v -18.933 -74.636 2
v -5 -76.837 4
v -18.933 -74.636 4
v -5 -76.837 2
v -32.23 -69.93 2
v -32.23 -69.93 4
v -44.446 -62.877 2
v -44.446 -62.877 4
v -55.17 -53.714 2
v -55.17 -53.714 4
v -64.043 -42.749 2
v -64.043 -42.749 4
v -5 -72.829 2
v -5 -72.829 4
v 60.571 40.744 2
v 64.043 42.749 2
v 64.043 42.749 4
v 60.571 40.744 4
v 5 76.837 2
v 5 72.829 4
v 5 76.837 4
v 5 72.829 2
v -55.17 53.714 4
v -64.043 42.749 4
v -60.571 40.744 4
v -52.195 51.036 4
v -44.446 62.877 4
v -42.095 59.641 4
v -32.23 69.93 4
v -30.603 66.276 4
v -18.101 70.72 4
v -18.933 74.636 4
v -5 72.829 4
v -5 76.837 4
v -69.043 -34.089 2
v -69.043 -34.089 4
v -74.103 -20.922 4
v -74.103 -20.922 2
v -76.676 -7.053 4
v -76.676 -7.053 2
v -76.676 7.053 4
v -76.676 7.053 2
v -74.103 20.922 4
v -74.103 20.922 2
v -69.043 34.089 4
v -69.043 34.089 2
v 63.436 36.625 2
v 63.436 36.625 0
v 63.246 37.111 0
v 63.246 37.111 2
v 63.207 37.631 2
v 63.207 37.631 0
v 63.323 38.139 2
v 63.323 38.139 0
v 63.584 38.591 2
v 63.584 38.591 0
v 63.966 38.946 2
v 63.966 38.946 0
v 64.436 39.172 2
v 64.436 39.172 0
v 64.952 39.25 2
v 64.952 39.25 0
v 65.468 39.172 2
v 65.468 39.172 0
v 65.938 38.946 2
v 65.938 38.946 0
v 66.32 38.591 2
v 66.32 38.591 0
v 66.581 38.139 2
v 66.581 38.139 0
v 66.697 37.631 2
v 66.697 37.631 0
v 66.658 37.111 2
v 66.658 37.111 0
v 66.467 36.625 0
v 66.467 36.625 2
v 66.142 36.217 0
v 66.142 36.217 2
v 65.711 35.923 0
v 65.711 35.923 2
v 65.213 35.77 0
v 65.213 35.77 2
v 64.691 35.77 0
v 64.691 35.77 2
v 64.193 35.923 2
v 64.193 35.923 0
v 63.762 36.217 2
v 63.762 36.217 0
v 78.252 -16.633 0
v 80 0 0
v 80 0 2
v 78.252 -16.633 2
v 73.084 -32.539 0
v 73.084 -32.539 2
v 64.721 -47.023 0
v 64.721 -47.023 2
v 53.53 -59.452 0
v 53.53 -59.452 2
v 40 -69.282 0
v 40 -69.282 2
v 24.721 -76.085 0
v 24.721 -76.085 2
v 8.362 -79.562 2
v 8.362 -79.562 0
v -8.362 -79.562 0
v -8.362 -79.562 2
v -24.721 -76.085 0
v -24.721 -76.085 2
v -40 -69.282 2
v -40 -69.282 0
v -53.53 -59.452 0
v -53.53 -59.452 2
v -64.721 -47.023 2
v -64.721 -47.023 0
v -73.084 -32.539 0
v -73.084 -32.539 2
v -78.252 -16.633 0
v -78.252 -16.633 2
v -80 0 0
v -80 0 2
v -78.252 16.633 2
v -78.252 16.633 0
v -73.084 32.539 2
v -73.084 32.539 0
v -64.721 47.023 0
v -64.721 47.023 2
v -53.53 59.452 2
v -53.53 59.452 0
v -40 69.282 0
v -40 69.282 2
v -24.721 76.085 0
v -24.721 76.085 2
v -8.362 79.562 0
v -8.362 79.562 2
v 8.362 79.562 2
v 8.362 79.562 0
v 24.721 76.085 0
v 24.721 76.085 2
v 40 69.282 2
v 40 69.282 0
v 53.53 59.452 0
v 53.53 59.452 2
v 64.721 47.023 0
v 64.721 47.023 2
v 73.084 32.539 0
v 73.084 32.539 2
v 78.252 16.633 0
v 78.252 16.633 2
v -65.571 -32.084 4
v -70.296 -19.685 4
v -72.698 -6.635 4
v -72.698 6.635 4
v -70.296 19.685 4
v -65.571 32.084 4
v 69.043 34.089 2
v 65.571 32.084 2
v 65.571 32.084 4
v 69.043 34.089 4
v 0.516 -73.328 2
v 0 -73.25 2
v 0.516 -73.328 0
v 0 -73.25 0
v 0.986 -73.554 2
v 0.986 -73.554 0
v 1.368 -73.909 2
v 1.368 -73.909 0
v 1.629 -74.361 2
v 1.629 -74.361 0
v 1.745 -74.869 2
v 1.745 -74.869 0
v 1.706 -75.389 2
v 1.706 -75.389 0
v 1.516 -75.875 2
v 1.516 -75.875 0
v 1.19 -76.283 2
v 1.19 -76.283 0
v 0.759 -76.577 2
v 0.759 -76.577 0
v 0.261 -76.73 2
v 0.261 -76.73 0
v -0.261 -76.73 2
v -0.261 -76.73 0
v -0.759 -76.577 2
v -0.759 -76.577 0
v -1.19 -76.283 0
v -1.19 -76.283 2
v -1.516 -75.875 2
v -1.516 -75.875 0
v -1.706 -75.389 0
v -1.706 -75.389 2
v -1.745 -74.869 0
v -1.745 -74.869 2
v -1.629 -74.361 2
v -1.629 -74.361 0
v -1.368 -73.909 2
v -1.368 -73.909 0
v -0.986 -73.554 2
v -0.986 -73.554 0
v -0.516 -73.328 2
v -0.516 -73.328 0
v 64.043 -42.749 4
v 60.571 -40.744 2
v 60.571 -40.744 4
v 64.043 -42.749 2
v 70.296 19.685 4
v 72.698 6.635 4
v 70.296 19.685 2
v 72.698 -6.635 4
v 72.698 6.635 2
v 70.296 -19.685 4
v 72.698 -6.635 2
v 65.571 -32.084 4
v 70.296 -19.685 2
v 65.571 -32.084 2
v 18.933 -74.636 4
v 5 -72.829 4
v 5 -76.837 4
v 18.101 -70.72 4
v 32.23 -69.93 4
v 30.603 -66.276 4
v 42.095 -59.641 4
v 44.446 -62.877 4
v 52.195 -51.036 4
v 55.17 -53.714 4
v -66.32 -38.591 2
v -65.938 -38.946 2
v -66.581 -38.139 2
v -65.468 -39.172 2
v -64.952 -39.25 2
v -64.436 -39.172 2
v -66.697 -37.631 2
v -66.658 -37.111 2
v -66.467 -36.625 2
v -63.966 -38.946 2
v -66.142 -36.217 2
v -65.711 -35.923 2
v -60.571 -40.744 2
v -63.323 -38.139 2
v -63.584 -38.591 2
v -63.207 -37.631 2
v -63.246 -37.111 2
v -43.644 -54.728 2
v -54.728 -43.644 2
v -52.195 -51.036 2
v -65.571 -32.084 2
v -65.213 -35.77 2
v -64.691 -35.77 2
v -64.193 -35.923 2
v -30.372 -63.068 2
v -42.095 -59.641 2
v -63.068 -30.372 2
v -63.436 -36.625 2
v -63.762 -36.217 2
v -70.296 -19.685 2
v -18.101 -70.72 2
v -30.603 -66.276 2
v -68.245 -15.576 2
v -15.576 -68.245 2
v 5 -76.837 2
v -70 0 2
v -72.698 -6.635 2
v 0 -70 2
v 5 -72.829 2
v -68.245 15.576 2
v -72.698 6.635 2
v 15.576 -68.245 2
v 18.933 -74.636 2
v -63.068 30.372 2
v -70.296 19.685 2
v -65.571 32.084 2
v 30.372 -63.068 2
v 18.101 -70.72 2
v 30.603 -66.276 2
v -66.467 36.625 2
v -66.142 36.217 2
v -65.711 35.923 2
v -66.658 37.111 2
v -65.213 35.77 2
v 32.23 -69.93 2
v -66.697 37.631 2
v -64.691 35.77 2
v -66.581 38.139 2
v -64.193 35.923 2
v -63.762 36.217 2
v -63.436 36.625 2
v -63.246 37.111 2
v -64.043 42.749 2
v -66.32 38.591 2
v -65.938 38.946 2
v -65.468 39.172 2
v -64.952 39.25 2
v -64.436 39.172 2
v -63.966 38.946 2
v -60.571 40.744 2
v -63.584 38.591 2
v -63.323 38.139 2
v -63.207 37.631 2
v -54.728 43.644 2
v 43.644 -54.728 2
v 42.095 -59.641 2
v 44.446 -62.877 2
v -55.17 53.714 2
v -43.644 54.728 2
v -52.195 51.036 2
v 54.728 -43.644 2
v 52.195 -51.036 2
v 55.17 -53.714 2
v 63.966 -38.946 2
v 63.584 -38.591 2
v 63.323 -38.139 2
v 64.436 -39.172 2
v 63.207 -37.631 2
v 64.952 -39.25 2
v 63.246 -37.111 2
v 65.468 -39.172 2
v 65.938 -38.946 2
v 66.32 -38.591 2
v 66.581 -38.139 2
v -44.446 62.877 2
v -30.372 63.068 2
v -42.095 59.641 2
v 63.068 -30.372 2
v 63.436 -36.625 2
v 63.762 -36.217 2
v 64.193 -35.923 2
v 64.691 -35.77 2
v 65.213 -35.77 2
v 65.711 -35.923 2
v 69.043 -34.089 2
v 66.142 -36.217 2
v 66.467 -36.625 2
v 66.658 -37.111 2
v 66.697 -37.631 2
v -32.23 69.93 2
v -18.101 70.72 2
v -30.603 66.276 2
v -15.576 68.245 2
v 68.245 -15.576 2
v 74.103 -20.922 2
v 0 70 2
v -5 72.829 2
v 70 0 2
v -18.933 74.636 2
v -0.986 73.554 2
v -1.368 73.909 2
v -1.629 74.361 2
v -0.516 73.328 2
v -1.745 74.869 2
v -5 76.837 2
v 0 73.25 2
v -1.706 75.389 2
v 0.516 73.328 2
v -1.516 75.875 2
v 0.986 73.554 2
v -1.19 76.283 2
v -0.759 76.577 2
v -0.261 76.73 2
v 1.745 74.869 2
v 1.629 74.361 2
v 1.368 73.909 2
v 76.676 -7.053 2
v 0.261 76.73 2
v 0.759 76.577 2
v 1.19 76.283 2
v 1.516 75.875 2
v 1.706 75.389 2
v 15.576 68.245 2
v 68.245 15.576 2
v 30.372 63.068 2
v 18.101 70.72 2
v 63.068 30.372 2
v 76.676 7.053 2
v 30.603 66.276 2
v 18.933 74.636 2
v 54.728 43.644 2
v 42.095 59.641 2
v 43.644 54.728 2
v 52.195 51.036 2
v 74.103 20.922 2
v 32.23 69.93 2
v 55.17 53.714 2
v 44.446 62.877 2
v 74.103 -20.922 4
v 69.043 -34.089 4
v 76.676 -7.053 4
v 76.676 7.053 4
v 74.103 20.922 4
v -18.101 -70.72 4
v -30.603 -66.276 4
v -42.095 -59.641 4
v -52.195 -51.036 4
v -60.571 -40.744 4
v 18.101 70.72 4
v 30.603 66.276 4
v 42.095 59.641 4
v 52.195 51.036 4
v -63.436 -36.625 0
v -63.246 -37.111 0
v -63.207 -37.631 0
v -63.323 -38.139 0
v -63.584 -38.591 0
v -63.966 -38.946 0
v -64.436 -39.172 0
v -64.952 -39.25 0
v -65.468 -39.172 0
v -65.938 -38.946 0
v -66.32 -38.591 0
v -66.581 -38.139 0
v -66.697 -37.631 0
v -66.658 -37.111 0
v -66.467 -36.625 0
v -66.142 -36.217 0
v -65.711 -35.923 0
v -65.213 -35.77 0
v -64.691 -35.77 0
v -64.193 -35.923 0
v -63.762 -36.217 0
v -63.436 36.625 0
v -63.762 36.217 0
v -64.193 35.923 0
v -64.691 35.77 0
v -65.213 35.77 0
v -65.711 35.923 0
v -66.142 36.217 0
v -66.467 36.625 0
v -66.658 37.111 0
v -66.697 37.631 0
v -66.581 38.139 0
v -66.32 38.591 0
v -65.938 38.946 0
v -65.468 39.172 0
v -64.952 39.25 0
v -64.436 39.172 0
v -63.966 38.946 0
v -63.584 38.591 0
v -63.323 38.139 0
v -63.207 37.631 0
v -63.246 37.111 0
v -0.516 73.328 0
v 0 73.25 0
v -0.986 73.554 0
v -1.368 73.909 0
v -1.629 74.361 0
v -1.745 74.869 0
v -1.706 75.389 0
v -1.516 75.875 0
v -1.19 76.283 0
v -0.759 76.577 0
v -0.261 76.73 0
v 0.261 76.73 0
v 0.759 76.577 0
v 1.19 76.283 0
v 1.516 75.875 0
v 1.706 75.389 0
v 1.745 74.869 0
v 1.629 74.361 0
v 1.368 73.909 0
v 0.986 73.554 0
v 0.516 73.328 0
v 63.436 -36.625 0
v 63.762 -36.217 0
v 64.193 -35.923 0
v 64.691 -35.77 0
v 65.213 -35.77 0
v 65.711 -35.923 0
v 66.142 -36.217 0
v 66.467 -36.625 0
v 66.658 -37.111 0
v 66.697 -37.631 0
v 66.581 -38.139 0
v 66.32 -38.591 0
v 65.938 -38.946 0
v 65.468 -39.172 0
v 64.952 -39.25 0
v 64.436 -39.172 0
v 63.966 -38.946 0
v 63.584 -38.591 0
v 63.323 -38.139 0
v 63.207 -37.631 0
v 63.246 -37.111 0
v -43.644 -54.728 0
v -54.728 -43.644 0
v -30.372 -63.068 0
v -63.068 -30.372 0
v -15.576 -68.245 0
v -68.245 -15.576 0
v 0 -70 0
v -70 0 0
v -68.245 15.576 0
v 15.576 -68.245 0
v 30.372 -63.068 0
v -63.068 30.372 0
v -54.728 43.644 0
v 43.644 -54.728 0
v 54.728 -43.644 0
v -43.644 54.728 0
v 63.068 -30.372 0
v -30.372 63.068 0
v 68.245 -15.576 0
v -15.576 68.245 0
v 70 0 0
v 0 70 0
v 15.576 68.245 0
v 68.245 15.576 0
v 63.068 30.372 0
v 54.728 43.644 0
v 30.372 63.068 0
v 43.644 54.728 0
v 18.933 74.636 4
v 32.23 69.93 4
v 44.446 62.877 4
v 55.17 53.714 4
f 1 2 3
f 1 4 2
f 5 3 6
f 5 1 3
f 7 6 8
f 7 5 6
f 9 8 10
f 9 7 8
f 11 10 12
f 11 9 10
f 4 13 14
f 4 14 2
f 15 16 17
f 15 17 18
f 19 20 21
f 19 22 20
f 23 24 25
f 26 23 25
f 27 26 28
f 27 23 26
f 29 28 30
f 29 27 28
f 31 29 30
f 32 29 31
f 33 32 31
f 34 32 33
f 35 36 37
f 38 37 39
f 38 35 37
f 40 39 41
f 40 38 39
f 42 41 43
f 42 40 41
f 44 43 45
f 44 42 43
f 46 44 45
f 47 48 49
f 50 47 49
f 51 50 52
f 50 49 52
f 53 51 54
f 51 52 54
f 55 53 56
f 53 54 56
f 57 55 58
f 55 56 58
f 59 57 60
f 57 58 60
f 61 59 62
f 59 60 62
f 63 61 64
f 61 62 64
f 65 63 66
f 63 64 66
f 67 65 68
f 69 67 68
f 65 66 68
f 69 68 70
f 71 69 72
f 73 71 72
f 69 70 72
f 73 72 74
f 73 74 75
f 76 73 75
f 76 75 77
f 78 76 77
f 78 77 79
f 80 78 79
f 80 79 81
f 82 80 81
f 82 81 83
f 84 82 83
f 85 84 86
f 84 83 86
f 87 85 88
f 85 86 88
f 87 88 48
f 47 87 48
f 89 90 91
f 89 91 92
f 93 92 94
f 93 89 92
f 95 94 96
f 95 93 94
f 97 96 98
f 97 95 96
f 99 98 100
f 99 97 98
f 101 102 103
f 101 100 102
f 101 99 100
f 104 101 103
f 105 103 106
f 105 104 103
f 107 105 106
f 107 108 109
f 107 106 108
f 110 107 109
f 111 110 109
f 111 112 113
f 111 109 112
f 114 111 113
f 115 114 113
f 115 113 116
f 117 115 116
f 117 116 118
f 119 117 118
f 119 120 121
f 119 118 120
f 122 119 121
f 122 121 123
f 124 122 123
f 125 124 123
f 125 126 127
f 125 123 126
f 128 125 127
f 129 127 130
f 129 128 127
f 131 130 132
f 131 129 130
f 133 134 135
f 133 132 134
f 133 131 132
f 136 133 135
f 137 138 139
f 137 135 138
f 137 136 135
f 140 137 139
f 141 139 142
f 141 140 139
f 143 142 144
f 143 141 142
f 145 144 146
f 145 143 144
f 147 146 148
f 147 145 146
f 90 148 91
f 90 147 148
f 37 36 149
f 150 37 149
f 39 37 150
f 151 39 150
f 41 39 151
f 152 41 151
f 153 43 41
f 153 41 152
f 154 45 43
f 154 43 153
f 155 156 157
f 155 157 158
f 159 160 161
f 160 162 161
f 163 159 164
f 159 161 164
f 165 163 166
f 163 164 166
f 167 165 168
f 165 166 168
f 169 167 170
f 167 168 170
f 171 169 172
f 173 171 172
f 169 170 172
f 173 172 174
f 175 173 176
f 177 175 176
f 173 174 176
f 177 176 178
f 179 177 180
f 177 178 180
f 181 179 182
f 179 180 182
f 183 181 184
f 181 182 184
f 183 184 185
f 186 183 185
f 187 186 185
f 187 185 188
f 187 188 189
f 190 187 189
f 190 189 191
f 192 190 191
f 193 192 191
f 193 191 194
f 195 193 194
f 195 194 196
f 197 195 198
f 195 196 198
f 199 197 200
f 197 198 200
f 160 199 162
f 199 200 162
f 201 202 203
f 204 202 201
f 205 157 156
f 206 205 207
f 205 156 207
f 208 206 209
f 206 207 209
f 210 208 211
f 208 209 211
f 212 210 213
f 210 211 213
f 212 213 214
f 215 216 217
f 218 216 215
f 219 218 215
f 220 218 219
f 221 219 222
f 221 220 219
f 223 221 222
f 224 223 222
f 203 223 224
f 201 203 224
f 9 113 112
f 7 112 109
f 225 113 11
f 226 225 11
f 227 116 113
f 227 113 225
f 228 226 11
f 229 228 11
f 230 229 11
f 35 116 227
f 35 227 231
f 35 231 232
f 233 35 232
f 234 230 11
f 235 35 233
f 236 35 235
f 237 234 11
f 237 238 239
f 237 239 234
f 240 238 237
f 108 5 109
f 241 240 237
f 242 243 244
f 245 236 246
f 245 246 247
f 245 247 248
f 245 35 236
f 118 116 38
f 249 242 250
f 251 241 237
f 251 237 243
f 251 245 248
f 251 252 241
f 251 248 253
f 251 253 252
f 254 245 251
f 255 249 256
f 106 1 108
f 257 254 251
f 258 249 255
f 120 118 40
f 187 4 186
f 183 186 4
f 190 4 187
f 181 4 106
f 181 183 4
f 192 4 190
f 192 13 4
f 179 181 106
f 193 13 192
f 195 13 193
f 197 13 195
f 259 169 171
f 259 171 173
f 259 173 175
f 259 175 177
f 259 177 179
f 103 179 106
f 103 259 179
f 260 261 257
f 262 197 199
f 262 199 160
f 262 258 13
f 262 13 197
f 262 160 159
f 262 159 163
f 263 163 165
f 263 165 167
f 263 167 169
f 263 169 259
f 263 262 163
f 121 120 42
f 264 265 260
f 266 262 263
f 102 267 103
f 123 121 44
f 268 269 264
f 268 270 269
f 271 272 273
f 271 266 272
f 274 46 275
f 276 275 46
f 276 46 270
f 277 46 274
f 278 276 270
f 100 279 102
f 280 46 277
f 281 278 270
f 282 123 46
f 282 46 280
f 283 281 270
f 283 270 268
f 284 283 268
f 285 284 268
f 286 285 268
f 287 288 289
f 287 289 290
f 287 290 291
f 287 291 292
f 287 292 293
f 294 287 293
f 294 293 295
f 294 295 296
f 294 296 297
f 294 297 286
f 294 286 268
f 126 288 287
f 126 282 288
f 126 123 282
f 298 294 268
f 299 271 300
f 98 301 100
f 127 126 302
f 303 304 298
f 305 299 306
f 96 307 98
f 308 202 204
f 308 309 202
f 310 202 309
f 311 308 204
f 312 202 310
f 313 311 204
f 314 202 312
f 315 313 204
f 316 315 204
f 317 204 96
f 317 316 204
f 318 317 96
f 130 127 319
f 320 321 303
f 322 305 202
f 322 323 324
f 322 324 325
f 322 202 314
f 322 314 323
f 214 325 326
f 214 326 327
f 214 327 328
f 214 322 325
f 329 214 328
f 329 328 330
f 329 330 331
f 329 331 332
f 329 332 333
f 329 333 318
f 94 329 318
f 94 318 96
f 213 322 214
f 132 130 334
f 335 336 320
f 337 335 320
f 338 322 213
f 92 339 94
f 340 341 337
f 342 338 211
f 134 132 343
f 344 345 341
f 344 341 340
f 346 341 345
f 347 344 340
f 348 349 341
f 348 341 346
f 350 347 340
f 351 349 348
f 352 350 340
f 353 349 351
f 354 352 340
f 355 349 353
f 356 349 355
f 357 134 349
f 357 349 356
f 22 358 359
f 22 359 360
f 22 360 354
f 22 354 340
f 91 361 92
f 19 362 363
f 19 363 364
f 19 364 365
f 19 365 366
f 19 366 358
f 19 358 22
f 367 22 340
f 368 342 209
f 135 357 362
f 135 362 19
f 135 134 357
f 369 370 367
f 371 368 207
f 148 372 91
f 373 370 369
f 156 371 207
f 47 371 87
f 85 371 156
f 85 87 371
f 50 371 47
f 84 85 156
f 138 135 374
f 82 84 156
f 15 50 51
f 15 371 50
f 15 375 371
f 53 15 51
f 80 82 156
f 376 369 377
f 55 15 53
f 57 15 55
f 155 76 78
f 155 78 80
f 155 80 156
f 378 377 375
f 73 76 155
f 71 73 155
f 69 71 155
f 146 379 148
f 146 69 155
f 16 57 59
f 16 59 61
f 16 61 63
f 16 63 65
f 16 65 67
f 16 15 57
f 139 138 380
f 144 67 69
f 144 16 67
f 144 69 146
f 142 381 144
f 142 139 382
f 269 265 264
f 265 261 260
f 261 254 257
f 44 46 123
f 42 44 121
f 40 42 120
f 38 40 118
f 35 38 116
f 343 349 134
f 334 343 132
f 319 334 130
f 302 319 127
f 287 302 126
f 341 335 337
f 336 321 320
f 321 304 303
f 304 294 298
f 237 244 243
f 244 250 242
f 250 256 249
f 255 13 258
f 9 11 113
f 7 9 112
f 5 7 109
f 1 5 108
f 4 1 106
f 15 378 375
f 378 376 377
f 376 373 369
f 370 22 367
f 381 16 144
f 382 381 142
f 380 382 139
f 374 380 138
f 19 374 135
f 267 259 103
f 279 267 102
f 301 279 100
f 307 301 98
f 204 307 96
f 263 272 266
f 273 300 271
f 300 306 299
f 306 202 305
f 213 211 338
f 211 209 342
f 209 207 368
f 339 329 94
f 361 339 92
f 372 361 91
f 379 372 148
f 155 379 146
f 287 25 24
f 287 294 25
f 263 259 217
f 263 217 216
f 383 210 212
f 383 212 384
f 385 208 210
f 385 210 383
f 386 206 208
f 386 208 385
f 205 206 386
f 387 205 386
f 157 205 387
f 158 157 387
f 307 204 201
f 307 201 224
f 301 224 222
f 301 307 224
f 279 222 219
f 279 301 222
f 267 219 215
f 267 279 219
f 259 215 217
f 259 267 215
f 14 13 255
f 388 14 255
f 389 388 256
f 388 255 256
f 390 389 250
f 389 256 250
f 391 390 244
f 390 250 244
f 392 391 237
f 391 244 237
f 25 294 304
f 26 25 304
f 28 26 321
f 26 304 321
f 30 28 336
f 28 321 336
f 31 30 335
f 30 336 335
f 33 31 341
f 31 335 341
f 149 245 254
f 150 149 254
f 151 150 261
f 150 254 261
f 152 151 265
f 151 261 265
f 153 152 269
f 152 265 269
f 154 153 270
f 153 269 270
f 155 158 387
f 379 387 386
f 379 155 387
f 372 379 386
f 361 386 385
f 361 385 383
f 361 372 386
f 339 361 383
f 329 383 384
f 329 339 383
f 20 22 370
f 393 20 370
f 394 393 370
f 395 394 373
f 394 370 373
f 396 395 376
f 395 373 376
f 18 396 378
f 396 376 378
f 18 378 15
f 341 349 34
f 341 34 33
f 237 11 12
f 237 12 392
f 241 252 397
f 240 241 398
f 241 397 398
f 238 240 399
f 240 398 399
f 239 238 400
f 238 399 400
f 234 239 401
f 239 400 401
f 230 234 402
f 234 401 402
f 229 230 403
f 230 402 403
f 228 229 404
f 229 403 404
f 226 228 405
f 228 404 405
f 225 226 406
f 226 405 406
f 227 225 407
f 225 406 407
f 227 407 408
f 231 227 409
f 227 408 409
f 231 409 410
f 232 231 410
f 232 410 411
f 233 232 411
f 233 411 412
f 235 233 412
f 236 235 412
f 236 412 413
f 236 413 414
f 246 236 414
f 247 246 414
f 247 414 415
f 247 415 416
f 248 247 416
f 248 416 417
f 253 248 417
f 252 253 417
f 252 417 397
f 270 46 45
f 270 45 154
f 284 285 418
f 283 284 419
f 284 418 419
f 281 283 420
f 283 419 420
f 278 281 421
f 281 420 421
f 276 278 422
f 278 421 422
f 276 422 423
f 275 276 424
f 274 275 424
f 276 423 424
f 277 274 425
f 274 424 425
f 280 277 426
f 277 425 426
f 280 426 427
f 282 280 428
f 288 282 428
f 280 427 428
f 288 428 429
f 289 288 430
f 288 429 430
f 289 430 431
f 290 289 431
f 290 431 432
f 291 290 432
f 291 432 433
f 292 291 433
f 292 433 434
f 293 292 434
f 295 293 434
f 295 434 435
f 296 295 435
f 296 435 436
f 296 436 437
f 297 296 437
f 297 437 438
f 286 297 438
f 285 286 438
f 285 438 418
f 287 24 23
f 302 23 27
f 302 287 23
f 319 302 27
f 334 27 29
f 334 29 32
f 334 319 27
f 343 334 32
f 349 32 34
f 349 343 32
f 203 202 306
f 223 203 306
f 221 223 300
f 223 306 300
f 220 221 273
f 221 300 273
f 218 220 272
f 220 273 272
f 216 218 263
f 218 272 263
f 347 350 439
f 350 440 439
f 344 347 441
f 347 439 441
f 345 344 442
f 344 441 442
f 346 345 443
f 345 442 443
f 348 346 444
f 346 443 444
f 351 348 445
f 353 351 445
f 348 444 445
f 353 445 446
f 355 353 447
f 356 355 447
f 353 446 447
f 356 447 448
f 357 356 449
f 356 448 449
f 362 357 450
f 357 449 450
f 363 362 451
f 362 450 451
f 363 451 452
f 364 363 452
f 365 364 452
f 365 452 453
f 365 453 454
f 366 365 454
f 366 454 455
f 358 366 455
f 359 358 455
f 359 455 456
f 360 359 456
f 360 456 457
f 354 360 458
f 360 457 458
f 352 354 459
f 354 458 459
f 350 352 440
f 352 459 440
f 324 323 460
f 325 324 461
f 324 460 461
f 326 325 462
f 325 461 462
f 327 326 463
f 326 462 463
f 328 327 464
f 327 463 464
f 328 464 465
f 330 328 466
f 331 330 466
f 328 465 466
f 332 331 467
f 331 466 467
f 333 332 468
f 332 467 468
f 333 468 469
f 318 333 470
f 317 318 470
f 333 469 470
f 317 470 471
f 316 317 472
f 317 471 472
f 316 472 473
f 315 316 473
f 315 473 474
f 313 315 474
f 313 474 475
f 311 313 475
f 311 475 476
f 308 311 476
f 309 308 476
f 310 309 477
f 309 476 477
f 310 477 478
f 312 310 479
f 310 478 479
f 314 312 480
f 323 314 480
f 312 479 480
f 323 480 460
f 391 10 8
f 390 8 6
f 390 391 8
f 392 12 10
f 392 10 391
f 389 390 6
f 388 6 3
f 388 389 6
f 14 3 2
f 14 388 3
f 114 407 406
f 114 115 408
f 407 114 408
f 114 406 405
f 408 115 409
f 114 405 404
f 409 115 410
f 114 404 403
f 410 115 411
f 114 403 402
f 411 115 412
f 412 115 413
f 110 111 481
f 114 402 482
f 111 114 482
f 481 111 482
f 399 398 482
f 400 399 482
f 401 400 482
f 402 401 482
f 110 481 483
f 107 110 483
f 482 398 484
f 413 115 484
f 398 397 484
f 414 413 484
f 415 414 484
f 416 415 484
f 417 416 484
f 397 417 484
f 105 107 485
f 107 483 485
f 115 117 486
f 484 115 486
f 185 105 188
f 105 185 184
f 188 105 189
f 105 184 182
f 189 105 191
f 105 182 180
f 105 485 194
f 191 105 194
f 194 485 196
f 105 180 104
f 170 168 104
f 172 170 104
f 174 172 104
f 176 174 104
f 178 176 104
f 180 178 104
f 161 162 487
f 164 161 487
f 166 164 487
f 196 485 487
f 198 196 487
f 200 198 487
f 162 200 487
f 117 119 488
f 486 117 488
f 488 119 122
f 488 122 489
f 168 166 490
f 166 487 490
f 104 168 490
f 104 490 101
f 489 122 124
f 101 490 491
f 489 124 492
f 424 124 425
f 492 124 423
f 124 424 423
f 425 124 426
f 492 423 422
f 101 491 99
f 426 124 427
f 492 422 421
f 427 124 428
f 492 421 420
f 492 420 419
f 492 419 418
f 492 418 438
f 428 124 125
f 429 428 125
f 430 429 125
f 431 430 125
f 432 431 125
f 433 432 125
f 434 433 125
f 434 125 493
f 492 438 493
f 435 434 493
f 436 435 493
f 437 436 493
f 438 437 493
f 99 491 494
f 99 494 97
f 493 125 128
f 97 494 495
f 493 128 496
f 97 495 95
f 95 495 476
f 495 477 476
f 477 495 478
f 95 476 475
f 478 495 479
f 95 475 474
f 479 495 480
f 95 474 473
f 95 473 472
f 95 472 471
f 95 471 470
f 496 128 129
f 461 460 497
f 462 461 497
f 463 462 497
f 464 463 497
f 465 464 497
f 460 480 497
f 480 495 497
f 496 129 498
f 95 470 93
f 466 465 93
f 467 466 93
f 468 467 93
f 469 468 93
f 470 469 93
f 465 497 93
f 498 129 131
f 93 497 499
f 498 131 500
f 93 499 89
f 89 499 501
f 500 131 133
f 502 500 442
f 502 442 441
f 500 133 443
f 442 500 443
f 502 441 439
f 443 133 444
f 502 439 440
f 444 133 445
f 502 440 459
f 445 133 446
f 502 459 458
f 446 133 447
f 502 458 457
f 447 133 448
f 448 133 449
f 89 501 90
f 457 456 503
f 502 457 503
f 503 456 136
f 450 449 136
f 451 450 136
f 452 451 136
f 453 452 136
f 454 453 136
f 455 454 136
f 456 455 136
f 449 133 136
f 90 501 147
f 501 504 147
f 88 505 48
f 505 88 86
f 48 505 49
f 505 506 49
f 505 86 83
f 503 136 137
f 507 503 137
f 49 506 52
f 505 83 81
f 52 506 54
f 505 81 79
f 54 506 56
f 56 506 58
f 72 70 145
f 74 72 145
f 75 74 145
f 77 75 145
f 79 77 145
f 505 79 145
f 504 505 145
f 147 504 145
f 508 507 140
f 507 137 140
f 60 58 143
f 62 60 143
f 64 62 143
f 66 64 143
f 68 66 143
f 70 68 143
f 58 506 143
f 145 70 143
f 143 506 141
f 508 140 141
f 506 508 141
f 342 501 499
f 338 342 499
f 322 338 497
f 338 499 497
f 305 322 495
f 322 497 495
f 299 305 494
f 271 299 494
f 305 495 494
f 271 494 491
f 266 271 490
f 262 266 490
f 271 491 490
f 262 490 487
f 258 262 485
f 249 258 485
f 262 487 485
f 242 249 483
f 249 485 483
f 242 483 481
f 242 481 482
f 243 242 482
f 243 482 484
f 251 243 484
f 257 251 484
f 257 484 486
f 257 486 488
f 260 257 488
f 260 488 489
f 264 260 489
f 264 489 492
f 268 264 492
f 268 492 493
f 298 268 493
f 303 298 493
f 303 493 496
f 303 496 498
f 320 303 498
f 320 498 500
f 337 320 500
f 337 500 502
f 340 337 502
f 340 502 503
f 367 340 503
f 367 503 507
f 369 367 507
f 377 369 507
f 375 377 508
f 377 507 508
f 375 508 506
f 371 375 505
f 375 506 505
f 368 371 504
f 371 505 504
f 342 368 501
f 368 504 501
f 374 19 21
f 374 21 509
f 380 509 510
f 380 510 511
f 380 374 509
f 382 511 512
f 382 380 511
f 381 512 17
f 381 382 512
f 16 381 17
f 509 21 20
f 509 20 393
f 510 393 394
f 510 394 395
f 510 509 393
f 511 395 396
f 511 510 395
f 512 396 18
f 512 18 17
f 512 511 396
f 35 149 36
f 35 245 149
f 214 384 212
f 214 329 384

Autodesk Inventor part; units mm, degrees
ref_plane "YZ Plane" through (0, 0, 0) normal (1, 0, 0) x (0, 1, 0)
ref_plane "XZ Plane" through (0, 0, 0) normal (0, 1, 0) x (-1, 0, 0)
ref_plane "XY Plane" through (0, 0, 0) normal (0, 0, 1) x (1, 0, 0)
sketch "スケッチ1" plane through (0, 0, 0) normal (0, 0, 1) x (1, 0, 0)
  circle A0 centre (0, 0) radius 80
  circle A1 centre (0, 0) radius 70
  dimension "d0" = 160
  dimension "d1" = 10
extrude "押し出し1" add sketch "スケッチ1" along normal blind 2
sketch "スケッチ2" plane through (0, 0, 2) normal (0, 0, 1) x (1, 0, 0)
  point P0 (0, 0)
  point P1 (0, 75)
  dimension "d4" = 75
hole "穴1" at (0, 75, 2) direction (0, 0, -1) diameter 3.5 end through all
pattern_circular "円形状パターン1" count 6 over 360 about axis through (0, 0, 0) along (0, 0, 1) of "穴1"
sketch "スケッチ3" plane through (0, 0, 2) normal (0, 0, 1) x (1, 0, 0)
  circle A0 centre (0, 0) radius 77
  circle A1 centre (0, 0) radius 73
  dimension "d15" = 154
  dimension "d16" = 146
extrude "押し出し2" add sketch "スケッチ3" along normal blind 2
sketch "スケッチ4" plane through (0, 0, 2) normal (0, 0, 1) x (1, 0, 0)
  circle A0 centre (0, 0) radius 70 projected
  circle A1 centre (0, 0) radius 80 projected
  line L0 (5, -69.8212) -> (-5, -69.8212)
  line L1 (-5, -69.8212) -> (-5, -79.8436)
  line L2 (-5, -79.8436) -> (5, -79.8436)
  line L3 (5, -79.8436) -> (5, -69.8212)
  dimension "d19" = 10
extrude "押し出し3" cut sketch "スケッチ4" along normal blind 2 contours A0 L3 L2 L1
pattern_circular "円形状パターン2" count 6 over 360 about axis through (0, 0, 0) along (0, 0, 1) of "押し出し3"
equation "\"d4\" = 0.5 * D"
equation "\"D\" = 150"
properties part number "外周ピン抑え"
